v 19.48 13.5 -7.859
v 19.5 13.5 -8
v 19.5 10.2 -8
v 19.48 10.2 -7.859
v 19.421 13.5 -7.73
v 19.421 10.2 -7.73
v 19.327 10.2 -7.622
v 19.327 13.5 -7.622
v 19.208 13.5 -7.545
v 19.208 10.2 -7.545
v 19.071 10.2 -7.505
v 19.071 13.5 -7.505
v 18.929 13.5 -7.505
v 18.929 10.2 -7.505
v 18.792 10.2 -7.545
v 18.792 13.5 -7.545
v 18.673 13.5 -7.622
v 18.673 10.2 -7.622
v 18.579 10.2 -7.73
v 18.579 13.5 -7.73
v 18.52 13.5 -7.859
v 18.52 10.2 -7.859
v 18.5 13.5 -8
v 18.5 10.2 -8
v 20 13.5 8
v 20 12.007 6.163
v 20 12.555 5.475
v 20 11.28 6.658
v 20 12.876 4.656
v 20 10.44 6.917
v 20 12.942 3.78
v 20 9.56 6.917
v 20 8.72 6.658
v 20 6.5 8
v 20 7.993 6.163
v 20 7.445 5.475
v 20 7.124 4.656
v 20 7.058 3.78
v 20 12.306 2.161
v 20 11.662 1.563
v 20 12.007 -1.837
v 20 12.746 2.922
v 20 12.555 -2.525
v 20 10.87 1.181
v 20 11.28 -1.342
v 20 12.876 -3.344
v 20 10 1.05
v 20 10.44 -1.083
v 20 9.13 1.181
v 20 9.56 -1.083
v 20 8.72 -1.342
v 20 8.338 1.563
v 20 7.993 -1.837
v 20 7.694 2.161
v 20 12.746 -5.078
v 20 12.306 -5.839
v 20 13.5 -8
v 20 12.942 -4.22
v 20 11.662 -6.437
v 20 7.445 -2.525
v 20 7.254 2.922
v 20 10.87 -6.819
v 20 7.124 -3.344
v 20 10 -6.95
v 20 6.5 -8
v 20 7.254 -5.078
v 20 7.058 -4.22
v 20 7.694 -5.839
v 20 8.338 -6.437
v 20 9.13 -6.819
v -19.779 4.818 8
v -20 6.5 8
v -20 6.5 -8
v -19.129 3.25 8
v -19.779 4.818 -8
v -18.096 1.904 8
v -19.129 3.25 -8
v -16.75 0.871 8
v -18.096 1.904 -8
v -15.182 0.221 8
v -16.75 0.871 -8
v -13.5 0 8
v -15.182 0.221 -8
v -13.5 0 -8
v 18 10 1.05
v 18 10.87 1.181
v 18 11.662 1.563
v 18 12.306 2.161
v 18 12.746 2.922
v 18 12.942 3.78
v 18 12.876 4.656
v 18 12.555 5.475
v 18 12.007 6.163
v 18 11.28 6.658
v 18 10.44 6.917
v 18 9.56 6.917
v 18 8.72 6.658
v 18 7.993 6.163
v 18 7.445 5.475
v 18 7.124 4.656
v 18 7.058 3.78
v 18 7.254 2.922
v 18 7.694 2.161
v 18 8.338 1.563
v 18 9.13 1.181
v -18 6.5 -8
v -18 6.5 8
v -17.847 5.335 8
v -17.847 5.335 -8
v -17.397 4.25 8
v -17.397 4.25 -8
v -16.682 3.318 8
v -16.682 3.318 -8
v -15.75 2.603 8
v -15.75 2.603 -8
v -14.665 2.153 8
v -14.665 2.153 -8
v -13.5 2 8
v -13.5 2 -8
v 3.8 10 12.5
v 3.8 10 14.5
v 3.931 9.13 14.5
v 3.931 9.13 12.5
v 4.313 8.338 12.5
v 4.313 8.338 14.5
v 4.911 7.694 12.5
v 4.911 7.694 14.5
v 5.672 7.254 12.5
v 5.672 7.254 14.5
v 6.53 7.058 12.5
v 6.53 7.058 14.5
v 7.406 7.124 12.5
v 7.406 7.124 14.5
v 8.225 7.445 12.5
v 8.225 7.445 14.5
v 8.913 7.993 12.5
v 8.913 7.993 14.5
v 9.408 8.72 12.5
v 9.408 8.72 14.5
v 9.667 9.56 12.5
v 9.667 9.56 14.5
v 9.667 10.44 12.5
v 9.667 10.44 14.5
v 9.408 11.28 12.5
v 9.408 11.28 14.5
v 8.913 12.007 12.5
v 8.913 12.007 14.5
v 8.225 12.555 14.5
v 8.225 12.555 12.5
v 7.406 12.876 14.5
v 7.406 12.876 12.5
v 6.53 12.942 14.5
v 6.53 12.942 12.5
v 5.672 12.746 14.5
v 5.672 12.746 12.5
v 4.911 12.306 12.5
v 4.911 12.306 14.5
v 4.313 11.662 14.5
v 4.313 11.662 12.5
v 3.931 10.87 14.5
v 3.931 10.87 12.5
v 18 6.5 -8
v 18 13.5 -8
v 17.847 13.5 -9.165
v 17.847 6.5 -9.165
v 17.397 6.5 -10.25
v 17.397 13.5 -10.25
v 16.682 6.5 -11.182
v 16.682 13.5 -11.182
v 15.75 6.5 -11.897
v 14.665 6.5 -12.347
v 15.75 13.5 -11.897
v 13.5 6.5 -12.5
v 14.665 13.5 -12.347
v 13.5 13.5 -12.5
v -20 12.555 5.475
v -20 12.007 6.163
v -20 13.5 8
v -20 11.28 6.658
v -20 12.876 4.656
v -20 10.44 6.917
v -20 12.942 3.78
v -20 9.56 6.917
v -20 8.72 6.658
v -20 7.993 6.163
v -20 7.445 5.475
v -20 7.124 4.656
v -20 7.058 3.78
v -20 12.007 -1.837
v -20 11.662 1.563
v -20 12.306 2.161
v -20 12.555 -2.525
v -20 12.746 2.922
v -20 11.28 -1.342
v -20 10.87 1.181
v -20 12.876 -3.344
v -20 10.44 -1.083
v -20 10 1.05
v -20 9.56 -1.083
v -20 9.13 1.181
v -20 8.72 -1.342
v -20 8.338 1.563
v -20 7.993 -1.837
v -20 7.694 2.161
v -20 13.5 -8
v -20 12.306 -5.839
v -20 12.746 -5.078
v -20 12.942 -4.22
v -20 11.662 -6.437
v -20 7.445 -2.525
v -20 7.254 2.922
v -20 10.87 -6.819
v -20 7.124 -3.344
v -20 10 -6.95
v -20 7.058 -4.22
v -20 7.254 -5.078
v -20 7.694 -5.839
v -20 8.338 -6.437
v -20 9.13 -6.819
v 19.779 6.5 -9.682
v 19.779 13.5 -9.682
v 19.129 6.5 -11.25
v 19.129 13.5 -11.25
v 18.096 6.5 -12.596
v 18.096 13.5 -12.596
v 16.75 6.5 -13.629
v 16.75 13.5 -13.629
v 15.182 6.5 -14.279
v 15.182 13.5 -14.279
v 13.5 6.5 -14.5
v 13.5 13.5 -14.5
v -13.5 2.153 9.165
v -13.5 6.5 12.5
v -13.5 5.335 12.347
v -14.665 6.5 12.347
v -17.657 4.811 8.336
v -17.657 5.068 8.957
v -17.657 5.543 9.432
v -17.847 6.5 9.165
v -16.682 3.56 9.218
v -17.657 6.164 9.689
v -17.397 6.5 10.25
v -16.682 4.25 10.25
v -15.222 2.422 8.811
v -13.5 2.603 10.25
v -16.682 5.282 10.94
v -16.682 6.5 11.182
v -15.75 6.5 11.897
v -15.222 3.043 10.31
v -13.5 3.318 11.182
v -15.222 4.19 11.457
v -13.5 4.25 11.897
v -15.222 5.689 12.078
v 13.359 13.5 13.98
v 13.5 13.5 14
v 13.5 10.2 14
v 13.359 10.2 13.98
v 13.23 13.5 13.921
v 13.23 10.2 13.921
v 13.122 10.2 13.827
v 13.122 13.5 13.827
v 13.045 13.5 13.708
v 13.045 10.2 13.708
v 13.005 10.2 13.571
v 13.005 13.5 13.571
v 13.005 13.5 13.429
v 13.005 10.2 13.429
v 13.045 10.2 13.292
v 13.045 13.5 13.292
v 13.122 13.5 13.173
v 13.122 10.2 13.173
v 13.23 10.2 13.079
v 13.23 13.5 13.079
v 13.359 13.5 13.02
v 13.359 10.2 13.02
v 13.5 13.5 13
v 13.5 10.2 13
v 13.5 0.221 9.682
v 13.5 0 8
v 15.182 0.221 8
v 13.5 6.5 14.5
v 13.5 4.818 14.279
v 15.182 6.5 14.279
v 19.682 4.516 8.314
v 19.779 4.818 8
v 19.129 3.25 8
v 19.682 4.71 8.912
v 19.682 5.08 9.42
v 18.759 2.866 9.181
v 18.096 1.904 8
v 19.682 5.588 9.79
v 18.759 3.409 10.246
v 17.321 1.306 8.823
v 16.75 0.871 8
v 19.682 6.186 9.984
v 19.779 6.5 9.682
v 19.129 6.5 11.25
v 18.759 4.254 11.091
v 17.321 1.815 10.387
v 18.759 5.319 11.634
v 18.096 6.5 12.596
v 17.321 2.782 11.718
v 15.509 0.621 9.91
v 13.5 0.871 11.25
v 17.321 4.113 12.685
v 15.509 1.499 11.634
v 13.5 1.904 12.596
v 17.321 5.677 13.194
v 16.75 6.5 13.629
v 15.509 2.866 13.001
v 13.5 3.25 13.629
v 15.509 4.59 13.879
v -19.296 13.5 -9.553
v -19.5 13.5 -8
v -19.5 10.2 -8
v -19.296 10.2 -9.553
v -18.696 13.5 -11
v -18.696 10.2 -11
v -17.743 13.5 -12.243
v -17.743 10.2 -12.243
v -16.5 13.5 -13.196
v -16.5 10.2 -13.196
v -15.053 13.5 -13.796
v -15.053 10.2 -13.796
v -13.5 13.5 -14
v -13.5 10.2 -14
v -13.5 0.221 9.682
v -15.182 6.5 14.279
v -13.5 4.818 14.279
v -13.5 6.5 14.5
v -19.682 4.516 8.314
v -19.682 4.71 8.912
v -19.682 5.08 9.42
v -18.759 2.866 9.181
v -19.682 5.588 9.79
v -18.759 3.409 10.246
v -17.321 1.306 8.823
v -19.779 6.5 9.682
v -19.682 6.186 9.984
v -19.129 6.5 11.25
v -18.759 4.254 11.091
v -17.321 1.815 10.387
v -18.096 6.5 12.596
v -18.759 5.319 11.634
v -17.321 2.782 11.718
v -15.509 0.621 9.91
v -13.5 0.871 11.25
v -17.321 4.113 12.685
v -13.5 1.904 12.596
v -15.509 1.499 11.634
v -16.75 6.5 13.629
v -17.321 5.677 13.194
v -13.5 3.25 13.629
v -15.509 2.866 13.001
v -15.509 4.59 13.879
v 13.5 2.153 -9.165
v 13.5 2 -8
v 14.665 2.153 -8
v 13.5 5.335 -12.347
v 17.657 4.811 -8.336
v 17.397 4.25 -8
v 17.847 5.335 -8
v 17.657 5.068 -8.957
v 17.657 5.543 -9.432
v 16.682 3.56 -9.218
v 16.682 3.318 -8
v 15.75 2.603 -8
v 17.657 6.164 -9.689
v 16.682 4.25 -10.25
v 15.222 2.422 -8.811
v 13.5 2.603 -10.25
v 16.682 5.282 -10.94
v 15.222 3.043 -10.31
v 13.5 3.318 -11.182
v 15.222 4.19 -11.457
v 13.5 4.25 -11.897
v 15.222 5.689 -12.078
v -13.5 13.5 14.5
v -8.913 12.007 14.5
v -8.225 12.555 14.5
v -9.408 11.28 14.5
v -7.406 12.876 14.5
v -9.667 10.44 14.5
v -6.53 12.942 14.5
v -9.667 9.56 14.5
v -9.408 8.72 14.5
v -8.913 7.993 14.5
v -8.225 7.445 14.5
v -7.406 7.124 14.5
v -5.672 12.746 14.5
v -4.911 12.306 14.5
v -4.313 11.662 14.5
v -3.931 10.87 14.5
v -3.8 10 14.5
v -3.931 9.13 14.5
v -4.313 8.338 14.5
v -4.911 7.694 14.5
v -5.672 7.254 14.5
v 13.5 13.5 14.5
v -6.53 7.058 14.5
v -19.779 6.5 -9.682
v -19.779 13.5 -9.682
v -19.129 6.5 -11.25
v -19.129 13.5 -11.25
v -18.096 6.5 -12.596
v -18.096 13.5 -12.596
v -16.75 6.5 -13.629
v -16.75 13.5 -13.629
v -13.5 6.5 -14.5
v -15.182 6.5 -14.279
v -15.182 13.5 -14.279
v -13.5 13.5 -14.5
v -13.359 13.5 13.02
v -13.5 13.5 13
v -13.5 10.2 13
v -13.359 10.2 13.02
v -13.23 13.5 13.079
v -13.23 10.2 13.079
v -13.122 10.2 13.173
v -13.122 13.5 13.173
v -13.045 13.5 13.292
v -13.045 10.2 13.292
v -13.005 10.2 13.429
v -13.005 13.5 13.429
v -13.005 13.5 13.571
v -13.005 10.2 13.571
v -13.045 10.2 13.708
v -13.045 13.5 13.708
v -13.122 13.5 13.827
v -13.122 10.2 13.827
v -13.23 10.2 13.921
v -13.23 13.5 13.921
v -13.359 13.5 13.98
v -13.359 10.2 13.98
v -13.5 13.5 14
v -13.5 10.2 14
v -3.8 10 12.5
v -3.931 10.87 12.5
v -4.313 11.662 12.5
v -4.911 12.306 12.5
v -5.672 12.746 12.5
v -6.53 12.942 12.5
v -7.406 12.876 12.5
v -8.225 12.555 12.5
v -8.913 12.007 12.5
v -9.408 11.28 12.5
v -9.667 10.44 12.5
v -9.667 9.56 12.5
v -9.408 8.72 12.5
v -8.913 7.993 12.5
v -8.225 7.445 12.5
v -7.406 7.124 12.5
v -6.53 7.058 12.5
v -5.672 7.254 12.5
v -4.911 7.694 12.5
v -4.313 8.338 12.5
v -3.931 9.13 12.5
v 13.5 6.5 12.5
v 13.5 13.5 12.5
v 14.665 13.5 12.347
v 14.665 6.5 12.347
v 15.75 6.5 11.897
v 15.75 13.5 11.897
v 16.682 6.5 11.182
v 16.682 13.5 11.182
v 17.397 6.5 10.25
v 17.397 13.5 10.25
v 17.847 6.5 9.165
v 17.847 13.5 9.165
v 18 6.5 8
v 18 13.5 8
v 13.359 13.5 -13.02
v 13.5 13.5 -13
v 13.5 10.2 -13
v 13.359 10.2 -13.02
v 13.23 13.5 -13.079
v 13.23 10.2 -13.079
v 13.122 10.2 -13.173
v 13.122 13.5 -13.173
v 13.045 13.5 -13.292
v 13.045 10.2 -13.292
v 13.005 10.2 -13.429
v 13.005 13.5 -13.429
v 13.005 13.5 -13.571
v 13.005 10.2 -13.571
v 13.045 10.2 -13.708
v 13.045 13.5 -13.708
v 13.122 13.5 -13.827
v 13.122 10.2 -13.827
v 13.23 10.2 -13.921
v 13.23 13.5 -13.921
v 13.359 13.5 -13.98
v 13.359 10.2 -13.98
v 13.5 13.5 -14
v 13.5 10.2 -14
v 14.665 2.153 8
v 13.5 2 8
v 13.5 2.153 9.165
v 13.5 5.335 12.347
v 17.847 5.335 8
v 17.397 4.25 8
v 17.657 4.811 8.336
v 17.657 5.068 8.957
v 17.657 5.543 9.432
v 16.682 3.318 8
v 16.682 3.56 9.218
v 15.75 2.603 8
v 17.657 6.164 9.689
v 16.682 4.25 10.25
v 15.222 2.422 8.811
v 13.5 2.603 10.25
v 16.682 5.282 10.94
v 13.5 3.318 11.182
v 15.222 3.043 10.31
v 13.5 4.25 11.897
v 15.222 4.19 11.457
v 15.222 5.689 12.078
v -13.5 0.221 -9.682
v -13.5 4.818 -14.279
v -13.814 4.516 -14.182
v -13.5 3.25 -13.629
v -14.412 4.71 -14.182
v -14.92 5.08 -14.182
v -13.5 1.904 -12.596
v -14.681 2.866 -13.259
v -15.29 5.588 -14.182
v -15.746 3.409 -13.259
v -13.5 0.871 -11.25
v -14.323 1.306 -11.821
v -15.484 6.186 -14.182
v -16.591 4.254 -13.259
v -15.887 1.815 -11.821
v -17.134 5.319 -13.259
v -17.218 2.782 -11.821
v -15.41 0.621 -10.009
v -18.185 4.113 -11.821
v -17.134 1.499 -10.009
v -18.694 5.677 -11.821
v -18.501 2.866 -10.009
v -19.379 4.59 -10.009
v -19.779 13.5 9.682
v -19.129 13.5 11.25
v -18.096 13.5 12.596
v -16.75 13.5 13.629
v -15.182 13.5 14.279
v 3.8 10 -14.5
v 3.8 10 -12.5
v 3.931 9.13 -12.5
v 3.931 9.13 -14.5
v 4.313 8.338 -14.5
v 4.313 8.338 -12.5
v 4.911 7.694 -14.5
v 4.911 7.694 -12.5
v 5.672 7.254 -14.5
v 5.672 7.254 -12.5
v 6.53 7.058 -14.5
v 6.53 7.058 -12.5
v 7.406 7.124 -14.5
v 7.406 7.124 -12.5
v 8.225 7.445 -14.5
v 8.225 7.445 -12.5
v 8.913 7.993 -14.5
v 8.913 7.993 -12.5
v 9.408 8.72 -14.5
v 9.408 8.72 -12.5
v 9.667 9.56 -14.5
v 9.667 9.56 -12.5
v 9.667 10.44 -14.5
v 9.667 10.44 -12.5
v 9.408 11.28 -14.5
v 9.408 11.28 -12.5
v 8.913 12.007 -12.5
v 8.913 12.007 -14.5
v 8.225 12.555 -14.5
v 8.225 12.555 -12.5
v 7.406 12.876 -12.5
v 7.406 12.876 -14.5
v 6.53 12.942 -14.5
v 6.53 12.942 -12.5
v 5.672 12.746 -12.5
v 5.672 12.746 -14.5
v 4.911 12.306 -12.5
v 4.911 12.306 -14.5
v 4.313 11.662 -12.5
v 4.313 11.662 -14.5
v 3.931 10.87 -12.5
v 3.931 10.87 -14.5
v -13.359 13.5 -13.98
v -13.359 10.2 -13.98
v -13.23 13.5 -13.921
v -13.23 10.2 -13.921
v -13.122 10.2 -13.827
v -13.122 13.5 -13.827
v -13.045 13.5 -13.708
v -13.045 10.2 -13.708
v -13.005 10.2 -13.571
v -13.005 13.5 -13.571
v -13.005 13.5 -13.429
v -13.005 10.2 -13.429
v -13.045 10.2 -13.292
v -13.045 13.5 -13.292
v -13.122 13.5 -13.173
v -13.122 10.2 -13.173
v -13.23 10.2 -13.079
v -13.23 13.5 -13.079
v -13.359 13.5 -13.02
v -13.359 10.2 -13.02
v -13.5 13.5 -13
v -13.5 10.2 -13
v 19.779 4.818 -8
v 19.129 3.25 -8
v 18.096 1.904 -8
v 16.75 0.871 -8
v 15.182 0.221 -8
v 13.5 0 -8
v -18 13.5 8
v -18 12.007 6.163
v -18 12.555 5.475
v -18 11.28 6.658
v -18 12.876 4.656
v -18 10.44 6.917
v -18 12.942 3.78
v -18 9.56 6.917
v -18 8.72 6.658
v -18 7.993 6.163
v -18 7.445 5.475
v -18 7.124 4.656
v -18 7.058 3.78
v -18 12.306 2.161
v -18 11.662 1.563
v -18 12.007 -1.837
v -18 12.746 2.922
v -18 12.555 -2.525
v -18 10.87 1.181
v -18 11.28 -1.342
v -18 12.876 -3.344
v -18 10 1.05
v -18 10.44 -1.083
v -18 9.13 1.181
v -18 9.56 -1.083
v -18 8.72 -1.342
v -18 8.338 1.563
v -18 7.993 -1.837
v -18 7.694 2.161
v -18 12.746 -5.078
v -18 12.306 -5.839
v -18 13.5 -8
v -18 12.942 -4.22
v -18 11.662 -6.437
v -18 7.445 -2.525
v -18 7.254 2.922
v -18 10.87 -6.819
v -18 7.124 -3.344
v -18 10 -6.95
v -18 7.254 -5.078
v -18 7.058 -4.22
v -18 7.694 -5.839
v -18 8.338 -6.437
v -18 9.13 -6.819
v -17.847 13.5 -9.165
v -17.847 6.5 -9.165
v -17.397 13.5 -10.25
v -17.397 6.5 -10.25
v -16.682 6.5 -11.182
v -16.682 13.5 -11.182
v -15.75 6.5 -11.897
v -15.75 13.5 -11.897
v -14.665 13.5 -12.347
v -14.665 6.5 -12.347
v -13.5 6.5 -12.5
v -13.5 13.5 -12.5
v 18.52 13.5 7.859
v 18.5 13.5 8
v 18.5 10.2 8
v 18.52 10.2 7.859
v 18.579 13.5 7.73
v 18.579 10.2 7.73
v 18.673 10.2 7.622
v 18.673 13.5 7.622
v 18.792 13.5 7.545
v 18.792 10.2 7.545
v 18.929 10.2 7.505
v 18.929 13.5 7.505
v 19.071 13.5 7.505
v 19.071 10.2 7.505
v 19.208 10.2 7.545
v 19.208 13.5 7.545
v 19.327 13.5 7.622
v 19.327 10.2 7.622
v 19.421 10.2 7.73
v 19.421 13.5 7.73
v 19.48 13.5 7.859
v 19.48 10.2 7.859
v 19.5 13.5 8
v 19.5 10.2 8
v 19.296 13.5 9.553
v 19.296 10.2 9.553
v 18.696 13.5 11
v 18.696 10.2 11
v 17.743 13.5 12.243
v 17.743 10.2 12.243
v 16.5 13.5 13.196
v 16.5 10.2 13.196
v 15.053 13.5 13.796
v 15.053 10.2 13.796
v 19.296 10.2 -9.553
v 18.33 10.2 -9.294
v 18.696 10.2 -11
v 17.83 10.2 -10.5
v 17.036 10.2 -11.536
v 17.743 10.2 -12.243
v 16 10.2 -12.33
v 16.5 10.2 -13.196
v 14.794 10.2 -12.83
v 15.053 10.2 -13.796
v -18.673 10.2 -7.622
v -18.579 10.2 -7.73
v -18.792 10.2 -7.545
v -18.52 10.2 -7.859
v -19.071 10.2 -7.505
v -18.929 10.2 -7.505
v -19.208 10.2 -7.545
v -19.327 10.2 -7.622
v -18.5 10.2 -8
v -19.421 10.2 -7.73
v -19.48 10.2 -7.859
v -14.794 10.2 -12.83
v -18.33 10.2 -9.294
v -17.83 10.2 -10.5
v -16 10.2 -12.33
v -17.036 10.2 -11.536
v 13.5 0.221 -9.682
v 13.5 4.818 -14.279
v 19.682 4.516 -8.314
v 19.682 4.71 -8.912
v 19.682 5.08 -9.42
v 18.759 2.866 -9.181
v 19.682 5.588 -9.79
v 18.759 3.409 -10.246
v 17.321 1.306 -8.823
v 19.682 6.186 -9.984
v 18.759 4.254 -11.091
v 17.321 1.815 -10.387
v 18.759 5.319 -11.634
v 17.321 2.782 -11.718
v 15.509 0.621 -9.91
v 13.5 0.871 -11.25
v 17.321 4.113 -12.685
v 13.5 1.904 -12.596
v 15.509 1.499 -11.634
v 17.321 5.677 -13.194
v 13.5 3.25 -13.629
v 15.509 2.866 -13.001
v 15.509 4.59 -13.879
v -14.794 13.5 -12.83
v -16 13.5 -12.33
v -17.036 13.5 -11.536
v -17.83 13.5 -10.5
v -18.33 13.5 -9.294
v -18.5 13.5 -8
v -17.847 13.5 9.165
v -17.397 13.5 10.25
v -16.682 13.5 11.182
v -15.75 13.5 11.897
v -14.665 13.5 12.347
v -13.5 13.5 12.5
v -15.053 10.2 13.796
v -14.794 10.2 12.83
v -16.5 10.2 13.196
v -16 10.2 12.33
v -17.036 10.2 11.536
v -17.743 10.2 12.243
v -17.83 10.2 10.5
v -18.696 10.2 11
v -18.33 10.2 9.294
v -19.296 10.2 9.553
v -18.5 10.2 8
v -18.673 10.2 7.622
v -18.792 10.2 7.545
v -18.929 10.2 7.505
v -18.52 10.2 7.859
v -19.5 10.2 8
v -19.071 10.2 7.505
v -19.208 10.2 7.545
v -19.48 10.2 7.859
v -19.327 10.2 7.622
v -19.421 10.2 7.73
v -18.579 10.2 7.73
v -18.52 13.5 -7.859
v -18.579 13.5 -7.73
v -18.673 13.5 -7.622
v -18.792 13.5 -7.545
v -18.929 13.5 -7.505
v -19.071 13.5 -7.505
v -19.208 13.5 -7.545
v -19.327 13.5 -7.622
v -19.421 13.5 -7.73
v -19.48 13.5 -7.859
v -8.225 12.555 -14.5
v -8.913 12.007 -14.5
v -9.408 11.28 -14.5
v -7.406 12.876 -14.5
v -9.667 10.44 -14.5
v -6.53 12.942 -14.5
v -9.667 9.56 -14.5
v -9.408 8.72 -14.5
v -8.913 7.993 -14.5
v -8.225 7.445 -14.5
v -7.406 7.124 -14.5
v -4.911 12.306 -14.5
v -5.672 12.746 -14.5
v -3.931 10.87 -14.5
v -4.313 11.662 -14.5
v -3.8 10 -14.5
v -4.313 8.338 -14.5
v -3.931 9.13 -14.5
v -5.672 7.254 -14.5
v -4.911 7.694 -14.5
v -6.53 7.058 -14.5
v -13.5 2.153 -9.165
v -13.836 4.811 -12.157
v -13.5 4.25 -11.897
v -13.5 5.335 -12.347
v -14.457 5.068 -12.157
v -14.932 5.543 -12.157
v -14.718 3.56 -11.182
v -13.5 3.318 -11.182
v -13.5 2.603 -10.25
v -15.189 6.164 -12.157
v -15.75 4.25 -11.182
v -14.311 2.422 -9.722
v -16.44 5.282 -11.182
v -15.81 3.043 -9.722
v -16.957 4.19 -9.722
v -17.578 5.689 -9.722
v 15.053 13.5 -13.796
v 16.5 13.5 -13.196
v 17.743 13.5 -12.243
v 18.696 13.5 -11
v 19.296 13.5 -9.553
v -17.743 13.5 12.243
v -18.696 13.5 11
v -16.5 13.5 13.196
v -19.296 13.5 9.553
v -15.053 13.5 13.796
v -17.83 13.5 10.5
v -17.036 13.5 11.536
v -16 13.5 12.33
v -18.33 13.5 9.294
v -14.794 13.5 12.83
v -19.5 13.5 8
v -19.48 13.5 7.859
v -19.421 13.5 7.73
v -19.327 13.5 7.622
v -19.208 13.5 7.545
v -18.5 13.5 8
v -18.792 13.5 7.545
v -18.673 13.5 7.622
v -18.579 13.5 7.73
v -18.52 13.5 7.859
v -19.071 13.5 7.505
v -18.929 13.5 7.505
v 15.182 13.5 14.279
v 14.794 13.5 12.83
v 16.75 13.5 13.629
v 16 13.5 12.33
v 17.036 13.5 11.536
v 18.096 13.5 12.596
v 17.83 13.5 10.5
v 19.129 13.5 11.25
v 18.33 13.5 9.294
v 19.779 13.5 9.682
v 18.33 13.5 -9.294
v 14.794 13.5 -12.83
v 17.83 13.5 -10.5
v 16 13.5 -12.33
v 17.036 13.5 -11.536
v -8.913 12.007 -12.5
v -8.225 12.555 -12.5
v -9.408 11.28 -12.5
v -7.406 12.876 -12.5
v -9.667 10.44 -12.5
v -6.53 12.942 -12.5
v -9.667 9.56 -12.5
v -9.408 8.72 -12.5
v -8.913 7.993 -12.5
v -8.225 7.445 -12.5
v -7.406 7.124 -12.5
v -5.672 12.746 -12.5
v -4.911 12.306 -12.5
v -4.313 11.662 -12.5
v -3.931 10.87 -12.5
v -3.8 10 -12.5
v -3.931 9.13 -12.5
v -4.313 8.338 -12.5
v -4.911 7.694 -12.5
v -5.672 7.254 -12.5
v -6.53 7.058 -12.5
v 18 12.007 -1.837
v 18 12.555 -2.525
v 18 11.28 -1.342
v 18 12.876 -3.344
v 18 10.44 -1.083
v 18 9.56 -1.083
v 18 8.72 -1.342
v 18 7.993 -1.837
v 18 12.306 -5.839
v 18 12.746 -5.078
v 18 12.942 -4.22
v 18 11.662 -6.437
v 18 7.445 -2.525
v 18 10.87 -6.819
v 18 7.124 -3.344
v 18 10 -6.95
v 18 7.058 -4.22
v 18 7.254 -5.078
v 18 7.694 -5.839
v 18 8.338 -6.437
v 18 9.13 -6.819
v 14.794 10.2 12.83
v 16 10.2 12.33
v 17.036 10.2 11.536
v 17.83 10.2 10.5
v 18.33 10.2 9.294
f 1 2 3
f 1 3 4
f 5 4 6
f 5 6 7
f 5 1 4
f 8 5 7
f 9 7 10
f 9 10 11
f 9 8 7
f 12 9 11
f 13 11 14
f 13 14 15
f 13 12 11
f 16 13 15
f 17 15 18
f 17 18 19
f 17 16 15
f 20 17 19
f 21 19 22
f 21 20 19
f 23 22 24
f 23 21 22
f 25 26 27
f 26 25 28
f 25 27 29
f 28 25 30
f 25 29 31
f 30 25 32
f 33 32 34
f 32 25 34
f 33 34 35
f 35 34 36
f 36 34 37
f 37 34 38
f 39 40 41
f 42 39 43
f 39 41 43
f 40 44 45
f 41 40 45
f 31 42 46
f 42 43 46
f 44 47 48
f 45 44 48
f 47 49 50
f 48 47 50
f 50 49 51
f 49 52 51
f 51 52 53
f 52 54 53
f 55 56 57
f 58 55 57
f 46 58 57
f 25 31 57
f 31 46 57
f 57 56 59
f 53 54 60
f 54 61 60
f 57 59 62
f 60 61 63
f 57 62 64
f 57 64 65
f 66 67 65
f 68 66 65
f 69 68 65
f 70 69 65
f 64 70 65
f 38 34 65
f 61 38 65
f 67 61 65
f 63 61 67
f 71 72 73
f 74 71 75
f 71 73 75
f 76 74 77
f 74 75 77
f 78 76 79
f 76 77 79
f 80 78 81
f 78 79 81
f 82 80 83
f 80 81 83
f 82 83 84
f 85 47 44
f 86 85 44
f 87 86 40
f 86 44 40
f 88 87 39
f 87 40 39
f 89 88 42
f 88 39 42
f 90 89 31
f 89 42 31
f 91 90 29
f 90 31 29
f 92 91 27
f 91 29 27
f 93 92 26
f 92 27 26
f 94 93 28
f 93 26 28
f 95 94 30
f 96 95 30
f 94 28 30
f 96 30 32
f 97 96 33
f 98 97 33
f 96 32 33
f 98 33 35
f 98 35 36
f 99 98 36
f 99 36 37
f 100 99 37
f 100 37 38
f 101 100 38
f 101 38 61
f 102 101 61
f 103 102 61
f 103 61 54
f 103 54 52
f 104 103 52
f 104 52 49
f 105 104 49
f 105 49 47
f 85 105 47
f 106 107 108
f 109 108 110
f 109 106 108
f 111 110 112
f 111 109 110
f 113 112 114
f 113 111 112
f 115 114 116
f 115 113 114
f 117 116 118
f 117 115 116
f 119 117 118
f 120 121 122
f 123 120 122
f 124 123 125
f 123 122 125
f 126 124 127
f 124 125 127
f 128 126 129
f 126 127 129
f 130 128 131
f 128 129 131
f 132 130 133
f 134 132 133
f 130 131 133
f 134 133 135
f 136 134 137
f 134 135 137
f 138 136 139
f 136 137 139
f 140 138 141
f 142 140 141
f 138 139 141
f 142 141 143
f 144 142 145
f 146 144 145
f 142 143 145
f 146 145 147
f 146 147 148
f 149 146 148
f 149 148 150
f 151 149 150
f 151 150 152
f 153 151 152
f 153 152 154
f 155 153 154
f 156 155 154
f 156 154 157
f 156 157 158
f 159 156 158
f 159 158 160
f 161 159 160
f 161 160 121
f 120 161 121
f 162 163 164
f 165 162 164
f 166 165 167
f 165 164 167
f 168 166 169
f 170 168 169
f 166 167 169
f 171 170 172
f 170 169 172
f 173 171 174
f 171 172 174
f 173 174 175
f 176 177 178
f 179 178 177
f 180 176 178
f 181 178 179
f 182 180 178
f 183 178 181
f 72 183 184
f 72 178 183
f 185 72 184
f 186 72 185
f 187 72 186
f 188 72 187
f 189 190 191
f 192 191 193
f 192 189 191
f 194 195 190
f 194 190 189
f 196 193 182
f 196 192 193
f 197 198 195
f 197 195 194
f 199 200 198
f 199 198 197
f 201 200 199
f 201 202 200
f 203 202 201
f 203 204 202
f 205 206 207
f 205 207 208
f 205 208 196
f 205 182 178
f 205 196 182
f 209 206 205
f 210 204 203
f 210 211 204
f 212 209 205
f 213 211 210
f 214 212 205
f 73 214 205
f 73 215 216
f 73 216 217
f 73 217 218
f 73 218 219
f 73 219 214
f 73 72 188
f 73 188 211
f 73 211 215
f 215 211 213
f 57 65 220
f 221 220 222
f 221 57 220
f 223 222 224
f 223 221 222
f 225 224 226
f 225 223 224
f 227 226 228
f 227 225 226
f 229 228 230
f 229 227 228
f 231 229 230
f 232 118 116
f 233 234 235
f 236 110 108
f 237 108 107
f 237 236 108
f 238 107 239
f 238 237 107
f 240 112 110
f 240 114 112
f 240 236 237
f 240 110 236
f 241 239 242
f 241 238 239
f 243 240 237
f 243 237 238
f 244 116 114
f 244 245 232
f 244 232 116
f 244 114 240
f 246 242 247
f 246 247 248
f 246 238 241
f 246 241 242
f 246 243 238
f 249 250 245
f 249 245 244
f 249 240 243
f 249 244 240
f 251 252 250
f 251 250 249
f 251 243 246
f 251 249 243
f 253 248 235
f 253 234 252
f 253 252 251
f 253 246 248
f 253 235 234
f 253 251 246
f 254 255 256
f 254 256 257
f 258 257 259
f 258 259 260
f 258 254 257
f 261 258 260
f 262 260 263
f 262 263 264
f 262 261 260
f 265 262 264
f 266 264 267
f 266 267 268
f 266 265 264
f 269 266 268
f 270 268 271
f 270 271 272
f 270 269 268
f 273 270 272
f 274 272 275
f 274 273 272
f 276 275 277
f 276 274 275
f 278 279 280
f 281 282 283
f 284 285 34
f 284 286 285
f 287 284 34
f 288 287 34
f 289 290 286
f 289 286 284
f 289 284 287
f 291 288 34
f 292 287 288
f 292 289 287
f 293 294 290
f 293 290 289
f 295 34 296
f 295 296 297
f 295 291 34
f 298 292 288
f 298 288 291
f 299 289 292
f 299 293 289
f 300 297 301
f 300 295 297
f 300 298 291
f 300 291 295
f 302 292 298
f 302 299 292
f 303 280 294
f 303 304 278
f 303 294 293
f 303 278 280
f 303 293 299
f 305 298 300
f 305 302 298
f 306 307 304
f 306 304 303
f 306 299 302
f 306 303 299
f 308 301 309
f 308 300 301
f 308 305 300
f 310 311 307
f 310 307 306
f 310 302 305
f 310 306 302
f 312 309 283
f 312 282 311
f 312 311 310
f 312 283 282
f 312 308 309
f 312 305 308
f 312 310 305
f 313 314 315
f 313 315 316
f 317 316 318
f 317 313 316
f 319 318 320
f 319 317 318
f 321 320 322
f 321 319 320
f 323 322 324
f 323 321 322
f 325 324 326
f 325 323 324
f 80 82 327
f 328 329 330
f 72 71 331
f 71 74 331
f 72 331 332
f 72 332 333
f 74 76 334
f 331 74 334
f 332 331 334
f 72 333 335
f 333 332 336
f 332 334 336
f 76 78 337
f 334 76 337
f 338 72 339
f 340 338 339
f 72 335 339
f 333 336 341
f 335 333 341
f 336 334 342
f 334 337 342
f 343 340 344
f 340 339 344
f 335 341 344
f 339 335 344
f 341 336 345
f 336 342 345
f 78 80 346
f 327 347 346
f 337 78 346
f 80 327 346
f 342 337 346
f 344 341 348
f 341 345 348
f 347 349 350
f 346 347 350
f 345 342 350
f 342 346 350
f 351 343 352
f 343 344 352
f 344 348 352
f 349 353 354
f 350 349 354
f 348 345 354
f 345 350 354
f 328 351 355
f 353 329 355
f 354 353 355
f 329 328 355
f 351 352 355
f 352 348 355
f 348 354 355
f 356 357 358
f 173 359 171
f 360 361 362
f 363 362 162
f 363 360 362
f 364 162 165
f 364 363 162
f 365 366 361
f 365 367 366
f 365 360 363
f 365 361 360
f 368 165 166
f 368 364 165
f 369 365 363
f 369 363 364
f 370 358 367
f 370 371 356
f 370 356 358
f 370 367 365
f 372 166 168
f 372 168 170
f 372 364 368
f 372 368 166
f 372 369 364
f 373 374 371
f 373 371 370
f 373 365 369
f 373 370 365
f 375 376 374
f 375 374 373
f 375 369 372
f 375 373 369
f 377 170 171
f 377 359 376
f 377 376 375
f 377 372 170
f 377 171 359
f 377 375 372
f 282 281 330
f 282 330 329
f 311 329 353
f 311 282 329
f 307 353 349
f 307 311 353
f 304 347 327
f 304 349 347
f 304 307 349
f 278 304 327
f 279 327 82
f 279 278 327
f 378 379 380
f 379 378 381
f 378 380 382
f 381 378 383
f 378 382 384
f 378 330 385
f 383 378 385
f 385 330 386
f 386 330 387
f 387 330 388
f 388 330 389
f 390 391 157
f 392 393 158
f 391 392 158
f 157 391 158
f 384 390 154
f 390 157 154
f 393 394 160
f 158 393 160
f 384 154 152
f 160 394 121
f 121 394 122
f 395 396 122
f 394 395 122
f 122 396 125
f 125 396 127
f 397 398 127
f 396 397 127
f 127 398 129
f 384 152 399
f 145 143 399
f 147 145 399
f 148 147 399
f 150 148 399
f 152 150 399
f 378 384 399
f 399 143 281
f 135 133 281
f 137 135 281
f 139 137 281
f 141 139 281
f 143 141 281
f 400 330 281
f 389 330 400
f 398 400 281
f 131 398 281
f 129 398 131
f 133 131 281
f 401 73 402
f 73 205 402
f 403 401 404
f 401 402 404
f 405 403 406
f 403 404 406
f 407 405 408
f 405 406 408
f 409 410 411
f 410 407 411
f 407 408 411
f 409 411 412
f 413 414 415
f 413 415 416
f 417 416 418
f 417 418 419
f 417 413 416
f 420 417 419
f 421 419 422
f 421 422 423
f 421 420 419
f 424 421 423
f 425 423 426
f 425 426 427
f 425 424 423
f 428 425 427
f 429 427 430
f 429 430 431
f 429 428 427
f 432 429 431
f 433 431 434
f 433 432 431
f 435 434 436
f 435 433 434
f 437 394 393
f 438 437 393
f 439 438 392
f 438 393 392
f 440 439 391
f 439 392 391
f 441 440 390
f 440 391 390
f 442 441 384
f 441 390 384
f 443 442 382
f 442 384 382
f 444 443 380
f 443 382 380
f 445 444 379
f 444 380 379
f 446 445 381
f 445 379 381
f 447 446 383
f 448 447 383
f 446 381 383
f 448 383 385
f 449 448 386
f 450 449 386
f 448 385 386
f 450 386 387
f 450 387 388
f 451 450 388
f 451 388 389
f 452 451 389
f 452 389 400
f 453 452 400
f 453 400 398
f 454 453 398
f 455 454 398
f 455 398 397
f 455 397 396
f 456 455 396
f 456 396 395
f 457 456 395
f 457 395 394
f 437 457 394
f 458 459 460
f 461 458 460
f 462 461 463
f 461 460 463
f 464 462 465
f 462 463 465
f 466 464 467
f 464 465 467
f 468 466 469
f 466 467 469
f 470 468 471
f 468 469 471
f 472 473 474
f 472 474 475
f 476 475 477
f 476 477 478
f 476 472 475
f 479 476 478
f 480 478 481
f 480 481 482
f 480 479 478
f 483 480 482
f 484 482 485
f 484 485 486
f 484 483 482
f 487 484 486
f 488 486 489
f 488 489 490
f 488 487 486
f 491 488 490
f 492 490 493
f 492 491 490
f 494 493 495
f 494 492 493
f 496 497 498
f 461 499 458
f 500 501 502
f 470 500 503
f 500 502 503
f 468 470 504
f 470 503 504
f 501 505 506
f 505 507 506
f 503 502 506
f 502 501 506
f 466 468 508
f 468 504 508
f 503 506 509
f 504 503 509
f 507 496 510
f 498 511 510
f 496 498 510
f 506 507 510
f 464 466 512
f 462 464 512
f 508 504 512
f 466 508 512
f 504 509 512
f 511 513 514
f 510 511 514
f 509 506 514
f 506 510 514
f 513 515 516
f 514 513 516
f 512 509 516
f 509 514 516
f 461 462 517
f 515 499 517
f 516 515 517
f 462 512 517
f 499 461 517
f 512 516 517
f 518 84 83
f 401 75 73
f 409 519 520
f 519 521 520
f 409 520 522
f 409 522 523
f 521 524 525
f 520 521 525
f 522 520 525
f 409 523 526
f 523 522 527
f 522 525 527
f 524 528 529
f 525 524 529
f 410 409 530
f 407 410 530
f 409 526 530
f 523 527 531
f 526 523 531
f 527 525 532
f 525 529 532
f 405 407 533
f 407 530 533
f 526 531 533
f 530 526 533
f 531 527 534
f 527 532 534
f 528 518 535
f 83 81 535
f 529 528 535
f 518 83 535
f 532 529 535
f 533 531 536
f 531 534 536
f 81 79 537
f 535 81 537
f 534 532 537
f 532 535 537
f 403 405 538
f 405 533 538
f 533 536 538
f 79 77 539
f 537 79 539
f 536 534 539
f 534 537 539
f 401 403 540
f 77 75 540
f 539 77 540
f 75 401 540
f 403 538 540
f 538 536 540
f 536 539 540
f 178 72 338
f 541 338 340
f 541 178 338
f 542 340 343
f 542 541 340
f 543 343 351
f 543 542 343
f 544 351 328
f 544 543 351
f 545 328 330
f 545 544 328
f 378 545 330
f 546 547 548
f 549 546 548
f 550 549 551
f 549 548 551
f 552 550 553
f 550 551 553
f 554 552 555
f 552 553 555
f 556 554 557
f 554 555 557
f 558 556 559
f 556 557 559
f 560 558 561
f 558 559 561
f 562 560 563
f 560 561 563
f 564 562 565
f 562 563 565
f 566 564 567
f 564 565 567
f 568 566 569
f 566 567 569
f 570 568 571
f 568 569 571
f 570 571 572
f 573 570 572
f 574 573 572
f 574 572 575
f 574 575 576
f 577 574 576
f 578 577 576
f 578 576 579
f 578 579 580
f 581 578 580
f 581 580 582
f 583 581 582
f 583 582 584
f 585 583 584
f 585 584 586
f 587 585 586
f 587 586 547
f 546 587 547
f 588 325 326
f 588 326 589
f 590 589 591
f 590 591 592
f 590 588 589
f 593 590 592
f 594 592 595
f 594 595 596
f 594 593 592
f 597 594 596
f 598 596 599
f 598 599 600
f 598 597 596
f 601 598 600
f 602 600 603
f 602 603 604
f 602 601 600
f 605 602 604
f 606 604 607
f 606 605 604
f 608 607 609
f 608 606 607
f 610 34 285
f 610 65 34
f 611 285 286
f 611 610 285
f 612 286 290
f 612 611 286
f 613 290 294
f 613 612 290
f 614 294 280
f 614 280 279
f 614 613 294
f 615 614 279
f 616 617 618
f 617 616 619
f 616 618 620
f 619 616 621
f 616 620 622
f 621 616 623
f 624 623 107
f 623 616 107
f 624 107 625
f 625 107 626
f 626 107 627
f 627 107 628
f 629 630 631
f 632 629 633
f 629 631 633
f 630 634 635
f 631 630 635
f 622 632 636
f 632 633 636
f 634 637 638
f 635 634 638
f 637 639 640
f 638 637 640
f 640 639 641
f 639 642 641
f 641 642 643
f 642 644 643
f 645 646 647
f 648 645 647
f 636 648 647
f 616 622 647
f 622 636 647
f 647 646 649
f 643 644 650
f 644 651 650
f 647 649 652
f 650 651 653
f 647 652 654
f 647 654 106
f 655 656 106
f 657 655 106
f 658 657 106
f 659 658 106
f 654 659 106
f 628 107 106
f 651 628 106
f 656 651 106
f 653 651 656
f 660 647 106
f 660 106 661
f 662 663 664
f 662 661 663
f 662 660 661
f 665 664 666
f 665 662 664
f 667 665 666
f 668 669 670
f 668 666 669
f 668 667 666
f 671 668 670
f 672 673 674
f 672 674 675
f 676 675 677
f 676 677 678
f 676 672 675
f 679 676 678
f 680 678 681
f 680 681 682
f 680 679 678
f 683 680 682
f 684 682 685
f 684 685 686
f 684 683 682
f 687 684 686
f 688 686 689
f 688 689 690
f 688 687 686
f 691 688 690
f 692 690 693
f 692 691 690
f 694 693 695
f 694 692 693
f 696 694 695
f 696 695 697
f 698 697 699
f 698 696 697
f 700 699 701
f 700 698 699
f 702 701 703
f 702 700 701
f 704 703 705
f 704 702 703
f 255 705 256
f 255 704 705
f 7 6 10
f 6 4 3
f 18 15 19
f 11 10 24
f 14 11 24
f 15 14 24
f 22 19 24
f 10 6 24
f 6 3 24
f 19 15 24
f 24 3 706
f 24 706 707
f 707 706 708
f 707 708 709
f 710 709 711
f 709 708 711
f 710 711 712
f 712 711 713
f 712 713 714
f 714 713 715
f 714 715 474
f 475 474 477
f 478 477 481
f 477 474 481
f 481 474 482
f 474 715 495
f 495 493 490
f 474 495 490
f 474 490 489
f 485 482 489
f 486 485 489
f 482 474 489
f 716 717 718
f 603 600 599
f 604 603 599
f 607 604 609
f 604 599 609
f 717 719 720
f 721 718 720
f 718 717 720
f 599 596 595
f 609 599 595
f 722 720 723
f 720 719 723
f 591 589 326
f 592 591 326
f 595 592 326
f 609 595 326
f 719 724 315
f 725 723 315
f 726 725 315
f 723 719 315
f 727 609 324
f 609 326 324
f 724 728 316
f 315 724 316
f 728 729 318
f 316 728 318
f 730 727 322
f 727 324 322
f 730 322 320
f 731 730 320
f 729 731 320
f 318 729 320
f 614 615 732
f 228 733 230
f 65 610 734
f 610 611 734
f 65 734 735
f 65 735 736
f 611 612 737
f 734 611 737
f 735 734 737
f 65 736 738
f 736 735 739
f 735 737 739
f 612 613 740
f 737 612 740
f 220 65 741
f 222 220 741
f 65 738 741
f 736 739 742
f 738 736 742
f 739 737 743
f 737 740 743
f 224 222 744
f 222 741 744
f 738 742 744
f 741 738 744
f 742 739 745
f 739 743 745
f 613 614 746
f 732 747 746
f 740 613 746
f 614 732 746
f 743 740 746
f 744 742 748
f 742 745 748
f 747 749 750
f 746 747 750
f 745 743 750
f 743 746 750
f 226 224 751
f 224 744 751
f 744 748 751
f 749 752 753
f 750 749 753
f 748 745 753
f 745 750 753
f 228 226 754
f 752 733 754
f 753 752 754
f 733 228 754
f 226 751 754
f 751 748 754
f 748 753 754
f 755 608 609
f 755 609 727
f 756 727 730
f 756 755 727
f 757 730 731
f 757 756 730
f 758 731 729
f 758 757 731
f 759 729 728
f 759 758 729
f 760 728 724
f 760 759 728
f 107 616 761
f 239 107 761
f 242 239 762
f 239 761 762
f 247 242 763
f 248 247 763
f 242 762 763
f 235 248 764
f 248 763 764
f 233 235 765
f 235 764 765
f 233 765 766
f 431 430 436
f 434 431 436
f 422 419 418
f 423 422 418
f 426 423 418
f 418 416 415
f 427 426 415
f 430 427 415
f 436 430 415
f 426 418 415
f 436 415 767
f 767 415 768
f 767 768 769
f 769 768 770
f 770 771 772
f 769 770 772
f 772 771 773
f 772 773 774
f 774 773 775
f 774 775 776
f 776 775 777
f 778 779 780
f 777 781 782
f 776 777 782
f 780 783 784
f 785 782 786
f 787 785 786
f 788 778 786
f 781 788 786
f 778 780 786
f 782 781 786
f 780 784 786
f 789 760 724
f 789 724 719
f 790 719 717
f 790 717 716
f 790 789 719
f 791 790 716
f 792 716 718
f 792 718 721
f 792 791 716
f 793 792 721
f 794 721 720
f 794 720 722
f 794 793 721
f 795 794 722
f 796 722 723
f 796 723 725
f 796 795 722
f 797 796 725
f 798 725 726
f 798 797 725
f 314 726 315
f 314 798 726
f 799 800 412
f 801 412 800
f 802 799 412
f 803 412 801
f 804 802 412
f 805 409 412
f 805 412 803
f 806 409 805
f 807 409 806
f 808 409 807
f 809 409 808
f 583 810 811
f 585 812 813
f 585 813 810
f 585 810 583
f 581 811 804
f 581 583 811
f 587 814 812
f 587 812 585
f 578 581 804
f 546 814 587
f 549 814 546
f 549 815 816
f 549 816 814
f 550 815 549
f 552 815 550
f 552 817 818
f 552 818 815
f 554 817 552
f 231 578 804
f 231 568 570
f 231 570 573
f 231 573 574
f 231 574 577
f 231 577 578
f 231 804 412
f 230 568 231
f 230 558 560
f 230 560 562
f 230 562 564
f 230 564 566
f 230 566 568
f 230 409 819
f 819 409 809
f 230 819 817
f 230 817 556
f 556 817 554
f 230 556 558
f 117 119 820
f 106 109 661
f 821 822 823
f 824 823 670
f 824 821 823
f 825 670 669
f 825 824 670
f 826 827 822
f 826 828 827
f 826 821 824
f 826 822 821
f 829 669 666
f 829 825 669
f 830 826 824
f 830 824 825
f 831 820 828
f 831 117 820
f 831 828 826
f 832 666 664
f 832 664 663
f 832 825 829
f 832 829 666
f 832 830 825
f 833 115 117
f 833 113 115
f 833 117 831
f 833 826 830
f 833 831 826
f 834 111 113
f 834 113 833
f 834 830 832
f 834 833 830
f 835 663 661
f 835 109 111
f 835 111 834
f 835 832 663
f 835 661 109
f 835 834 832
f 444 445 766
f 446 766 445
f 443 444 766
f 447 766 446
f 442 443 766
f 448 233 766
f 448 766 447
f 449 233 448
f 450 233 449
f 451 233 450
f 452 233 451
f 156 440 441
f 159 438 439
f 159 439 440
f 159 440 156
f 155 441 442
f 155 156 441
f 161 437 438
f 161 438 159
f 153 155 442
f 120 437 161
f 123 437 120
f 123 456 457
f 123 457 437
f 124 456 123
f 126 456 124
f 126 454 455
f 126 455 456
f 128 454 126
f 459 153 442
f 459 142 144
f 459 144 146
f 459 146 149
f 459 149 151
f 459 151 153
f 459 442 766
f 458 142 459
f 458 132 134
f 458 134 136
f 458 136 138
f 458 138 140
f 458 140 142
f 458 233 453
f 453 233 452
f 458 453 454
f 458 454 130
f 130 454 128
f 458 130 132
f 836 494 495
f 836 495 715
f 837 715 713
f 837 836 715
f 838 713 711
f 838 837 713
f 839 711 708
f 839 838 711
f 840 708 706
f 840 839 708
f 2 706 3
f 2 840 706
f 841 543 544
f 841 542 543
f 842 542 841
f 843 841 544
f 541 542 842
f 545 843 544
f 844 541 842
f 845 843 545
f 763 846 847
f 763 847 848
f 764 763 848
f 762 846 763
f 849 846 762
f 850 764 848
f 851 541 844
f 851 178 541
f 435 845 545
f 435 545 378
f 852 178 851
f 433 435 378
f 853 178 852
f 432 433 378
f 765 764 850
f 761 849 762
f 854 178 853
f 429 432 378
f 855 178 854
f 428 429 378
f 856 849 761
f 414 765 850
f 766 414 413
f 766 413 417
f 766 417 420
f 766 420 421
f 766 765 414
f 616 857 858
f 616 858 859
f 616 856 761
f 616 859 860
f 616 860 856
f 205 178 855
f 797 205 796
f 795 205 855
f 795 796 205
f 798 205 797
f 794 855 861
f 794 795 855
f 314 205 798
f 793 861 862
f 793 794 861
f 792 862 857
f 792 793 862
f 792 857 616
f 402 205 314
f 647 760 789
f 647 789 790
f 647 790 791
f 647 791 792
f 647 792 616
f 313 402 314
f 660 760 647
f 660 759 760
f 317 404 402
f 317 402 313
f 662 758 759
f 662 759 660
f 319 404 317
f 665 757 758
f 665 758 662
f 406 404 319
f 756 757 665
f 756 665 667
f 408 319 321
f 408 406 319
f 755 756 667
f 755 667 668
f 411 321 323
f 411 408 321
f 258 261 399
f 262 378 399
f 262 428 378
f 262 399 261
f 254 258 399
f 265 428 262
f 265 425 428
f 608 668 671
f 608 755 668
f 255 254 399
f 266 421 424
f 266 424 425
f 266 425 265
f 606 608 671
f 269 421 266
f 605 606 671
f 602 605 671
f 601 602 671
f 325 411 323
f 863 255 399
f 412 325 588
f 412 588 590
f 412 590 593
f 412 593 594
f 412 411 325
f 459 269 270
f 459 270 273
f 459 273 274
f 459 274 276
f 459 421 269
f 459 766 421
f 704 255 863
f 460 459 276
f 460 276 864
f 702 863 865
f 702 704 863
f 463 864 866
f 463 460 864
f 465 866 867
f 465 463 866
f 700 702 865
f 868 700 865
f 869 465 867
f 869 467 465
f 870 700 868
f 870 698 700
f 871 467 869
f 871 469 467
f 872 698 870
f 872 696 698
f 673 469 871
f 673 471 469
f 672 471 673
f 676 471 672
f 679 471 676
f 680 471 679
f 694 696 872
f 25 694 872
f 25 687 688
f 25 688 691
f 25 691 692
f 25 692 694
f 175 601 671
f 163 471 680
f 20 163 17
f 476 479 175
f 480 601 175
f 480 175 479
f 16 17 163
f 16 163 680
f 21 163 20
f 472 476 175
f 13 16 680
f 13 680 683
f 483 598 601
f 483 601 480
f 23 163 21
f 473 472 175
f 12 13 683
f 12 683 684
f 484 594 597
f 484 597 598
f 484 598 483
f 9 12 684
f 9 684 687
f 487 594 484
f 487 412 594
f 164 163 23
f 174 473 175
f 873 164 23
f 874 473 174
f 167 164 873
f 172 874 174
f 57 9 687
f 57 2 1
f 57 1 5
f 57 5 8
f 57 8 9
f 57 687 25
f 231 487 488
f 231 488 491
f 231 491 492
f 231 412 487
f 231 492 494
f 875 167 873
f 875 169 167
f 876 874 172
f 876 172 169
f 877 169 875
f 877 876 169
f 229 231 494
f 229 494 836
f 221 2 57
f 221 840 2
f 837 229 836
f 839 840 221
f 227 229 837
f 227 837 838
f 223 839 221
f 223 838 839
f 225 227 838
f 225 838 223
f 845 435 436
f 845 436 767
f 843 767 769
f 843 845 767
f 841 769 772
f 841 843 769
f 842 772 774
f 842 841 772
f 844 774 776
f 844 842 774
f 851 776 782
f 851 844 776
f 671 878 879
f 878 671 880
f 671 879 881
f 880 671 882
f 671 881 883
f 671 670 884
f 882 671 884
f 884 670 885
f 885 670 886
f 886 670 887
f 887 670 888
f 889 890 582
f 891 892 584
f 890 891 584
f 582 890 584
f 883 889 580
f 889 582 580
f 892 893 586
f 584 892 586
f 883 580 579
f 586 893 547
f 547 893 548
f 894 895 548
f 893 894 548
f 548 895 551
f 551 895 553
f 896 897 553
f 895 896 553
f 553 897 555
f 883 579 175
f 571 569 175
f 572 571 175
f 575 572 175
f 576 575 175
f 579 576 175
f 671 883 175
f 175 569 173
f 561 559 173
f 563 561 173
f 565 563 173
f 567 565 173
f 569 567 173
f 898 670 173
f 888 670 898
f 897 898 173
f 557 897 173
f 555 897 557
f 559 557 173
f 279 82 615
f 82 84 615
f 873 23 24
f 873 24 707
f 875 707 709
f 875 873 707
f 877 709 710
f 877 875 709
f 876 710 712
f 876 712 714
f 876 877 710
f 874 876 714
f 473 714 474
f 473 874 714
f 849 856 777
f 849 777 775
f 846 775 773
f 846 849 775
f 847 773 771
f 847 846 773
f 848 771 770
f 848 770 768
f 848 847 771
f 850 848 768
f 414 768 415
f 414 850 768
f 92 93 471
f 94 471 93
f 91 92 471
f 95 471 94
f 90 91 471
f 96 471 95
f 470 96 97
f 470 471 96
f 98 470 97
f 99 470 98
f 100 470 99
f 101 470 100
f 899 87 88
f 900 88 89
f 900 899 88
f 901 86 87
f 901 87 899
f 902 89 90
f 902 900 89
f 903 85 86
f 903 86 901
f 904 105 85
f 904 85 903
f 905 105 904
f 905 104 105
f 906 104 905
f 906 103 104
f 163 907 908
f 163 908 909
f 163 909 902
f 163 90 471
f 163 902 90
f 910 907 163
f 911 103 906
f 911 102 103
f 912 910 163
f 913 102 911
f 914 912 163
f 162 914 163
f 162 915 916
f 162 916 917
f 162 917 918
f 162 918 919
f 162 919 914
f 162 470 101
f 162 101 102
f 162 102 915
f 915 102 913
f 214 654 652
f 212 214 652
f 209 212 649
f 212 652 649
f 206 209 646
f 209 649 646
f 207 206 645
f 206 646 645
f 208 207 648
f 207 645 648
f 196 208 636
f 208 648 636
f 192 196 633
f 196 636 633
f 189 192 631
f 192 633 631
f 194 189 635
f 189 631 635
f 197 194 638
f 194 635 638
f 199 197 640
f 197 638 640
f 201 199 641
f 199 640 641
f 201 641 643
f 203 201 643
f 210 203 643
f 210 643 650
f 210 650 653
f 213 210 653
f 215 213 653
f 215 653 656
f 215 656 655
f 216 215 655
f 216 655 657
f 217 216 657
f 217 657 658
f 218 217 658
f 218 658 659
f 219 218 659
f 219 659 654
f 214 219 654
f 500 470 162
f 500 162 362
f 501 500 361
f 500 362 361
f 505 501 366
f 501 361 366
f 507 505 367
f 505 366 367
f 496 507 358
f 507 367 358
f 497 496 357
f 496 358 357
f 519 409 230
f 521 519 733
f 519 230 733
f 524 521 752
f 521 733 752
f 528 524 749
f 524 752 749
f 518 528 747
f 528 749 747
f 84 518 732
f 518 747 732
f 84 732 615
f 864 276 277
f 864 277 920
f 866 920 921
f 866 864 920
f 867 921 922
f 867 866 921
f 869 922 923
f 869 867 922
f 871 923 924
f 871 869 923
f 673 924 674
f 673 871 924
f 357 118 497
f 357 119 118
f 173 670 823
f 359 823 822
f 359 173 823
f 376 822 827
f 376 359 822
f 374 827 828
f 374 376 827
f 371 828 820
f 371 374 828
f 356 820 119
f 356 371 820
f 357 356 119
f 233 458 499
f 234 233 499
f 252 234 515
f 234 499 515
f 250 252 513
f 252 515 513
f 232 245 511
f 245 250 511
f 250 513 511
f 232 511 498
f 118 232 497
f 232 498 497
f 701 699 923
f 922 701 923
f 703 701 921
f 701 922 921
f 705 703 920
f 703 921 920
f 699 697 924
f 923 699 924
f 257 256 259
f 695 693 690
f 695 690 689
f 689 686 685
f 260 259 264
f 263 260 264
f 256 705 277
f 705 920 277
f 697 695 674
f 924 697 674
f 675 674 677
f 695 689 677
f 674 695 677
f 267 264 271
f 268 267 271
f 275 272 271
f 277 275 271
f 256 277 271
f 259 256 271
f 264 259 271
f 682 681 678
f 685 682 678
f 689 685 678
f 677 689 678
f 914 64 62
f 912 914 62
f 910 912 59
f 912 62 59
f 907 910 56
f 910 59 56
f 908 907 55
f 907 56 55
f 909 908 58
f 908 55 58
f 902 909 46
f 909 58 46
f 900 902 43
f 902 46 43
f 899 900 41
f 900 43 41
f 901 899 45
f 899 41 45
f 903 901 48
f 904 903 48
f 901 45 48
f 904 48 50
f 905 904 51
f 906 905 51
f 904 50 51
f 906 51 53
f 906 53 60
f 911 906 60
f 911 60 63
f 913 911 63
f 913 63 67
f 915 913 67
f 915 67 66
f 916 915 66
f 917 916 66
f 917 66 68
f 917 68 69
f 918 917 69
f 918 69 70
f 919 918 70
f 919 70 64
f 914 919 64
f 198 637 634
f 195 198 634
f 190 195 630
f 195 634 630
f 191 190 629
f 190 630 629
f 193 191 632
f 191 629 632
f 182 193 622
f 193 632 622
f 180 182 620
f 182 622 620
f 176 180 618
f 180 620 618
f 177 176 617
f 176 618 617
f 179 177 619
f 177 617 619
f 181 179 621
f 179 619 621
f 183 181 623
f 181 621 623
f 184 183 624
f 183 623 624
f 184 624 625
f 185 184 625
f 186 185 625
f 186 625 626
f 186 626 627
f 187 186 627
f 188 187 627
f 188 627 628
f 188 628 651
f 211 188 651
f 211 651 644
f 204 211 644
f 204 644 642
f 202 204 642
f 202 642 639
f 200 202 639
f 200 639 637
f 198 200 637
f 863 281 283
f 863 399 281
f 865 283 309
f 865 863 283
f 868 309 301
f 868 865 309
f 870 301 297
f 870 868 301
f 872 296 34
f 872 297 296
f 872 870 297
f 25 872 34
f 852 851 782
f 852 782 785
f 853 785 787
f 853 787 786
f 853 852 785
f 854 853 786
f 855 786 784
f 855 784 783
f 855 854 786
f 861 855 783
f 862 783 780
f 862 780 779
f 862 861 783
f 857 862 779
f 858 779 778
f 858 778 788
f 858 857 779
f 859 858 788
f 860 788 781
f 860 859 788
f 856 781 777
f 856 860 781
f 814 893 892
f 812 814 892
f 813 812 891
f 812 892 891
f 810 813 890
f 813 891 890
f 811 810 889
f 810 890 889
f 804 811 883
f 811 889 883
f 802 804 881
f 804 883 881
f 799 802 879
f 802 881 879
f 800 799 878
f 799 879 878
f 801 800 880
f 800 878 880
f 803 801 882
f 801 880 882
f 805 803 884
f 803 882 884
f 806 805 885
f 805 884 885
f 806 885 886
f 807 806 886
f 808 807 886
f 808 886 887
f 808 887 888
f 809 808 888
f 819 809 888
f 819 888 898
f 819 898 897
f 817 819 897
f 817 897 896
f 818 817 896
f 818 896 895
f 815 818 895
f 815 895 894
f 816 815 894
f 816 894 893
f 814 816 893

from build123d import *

# Parameters (mm, degrees)
SKETCH1_W               = 40
SKETCH1_H               = 29
BOSS_EXTRUDE1_DEPTH     = 20
FILLET2_R               = 6.5
SKETCH6_W               = 47.866272002
SKETCH6_H               = 35.823148672
CUT_EXTRUDE6_DEPTH      = 7.5
SHELL1_T                = -2
SKETCH7_R               = 2.95
CUT_EXTRUDE7_DEPTH      = 1
CUT_EXTRUDE7_DEPTH_BACK = 41
SKETCH8_R               = 2.95
CUT_EXTRUDE8_DEPTH      = 30
CUT_EXTRUDE10_DEPTH     = 3.3


with BuildPart() as part:
    # Sketch1 → Boss-Extrude1 (new body)
    with BuildSketch(Plane(origin=(0, 0, 0), x_dir=(1, 0, 0), z_dir=(0, 1, 0))):
        Rectangle(SKETCH1_W, SKETCH1_H)
    extrude(amount=BOSS_EXTRUDE1_DEPTH)

    # Fillet2
    fillet2_edges = [part.edges().sort_by_distance(p)[0] for p in [
        (-20, 20, 0),
        (0, 20, 14.5),
        (20, 20, 0),
        (0, 0, 14.5),
        (-20, 0, 0),
        (0, 0, -14.5),
        (20, 0, 0),
        (20, 10, 14.5),
        (-20, 10, 14.5),
        (-20, 10, -14.5),
        (20, 10, -14.5),
        (0, 20, -14.5),
    ]]
    fillet(fillet2_edges, radius=FILLET2_R)

    # Sketch6 → Cut-Extrude6 (cut, through all)
    with BuildSketch(Plane(origin=(0, 13.5, 0), x_dir=(1, 0, 0), z_dir=(0, 1, 0))):
        Rectangle(SKETCH6_W, SKETCH6_H)
    extrude(amount=CUT_EXTRUDE6_DEPTH, mode=Mode.SUBTRACT)

    # Shell1
    shell1_openings = [part.faces().sort_by_distance(p)[0] for p in [
        (0, 13.5, 0),
    ]]
    offset(amount=SHELL1_T, openings=shell1_openings, kind=Kind.INTERSECTION)

    # Sketch7 → Cut-Extrude7 (cut, two sides)
    with BuildSketch(Plane(origin=(20, 0, 0), x_dir=(0, 0, -1), z_dir=(1, 0, 0))) as cut_extrude7_sk:
        with Locations((4, 10)):
            Circle(SKETCH7_R)
        with Locations((-4, 10)):
            Circle(SKETCH7_R)
    extrude(amount=CUT_EXTRUDE7_DEPTH, mode=Mode.SUBTRACT)
    extrude(cut_extrude7_sk.sketch, amount=-CUT_EXTRUDE7_DEPTH_BACK, mode=Mode.SUBTRACT)

    # Sketch8 → Cut-Extrude8 (cut, through all)
    with BuildSketch(Plane.XY.offset(14.5)):
        with Locations((-6.75, 10)):
            Circle(SKETCH8_R)
        with Locations(Location((6.75, 10, 0), (0, 0, 180))):  # turned: the seam where the file's is
            Circle(SKETCH8_R)
    extrude(amount=-CUT_EXTRUDE8_DEPTH, mode=Mode.SUBTRACT)

    # Sketch10 → Cut-Extrude10 (cut)
    with BuildSketch(Plane(origin=(0, 13.5, 0), x_dir=(1, 0, 0), z_dir=(0, 1, 0))):
        with BuildLine():
            ThreePointArc((-18.5, -8), (-17.035533906, -11.535533906), (-13.5, -13))
            ThreePointArc((-13.5, -13), (-13, -13.5), (-13.5, -14))
            ThreePointArc((-13.5, -14), (-17.742640687, -12.242640687), (-19.5, -8))
            ThreePointArc((-19.5, -8), (-19, -7.5), (-18.5, -8))
        make_face()
        with BuildLine():
            ThreePointArc((-13.5, 13), (-17.035533906, 11.535533906), (-18.5, 8))
            ThreePointArc((-18.5, 8), (-19, 7.5), (-19.5, 8))
            ThreePointArc((-19.5, 8), (-17.742640687, 12.242640687), (-13.5, 14))
            ThreePointArc((-13.5, 14), (-13, 13.5), (-13.5, 13))
        make_face()
        with BuildLine():
            ThreePointArc((18.5, 8), (17.035533906, 11.535533906), (13.5, 13))
            ThreePointArc((13.5, 13), (13, 13.5), (13.5, 14))
            ThreePointArc((13.5, 14), (17.742640687, 12.242640687), (19.5, 8))
            ThreePointArc((19.5, 8), (19, 7.5), (18.5, 8))
        make_face()
        with BuildLine():
            ThreePointArc((13.5, -13), (17.035533906, -11.535533906), (18.5, -8))
            ThreePointArc((18.5, -8), (19, -7.5), (19.5, -8))
            ThreePointArc((19.5, -8), (17.742640687, -12.242640687), (13.5, -14))
            ThreePointArc((13.5, -14), (13, -13.5), (13.5, -13))
        make_face()
    extrude(amount=-CUT_EXTRUDE10_DEPTH, mode=Mode.SUBTRACT)


solid = part.part
